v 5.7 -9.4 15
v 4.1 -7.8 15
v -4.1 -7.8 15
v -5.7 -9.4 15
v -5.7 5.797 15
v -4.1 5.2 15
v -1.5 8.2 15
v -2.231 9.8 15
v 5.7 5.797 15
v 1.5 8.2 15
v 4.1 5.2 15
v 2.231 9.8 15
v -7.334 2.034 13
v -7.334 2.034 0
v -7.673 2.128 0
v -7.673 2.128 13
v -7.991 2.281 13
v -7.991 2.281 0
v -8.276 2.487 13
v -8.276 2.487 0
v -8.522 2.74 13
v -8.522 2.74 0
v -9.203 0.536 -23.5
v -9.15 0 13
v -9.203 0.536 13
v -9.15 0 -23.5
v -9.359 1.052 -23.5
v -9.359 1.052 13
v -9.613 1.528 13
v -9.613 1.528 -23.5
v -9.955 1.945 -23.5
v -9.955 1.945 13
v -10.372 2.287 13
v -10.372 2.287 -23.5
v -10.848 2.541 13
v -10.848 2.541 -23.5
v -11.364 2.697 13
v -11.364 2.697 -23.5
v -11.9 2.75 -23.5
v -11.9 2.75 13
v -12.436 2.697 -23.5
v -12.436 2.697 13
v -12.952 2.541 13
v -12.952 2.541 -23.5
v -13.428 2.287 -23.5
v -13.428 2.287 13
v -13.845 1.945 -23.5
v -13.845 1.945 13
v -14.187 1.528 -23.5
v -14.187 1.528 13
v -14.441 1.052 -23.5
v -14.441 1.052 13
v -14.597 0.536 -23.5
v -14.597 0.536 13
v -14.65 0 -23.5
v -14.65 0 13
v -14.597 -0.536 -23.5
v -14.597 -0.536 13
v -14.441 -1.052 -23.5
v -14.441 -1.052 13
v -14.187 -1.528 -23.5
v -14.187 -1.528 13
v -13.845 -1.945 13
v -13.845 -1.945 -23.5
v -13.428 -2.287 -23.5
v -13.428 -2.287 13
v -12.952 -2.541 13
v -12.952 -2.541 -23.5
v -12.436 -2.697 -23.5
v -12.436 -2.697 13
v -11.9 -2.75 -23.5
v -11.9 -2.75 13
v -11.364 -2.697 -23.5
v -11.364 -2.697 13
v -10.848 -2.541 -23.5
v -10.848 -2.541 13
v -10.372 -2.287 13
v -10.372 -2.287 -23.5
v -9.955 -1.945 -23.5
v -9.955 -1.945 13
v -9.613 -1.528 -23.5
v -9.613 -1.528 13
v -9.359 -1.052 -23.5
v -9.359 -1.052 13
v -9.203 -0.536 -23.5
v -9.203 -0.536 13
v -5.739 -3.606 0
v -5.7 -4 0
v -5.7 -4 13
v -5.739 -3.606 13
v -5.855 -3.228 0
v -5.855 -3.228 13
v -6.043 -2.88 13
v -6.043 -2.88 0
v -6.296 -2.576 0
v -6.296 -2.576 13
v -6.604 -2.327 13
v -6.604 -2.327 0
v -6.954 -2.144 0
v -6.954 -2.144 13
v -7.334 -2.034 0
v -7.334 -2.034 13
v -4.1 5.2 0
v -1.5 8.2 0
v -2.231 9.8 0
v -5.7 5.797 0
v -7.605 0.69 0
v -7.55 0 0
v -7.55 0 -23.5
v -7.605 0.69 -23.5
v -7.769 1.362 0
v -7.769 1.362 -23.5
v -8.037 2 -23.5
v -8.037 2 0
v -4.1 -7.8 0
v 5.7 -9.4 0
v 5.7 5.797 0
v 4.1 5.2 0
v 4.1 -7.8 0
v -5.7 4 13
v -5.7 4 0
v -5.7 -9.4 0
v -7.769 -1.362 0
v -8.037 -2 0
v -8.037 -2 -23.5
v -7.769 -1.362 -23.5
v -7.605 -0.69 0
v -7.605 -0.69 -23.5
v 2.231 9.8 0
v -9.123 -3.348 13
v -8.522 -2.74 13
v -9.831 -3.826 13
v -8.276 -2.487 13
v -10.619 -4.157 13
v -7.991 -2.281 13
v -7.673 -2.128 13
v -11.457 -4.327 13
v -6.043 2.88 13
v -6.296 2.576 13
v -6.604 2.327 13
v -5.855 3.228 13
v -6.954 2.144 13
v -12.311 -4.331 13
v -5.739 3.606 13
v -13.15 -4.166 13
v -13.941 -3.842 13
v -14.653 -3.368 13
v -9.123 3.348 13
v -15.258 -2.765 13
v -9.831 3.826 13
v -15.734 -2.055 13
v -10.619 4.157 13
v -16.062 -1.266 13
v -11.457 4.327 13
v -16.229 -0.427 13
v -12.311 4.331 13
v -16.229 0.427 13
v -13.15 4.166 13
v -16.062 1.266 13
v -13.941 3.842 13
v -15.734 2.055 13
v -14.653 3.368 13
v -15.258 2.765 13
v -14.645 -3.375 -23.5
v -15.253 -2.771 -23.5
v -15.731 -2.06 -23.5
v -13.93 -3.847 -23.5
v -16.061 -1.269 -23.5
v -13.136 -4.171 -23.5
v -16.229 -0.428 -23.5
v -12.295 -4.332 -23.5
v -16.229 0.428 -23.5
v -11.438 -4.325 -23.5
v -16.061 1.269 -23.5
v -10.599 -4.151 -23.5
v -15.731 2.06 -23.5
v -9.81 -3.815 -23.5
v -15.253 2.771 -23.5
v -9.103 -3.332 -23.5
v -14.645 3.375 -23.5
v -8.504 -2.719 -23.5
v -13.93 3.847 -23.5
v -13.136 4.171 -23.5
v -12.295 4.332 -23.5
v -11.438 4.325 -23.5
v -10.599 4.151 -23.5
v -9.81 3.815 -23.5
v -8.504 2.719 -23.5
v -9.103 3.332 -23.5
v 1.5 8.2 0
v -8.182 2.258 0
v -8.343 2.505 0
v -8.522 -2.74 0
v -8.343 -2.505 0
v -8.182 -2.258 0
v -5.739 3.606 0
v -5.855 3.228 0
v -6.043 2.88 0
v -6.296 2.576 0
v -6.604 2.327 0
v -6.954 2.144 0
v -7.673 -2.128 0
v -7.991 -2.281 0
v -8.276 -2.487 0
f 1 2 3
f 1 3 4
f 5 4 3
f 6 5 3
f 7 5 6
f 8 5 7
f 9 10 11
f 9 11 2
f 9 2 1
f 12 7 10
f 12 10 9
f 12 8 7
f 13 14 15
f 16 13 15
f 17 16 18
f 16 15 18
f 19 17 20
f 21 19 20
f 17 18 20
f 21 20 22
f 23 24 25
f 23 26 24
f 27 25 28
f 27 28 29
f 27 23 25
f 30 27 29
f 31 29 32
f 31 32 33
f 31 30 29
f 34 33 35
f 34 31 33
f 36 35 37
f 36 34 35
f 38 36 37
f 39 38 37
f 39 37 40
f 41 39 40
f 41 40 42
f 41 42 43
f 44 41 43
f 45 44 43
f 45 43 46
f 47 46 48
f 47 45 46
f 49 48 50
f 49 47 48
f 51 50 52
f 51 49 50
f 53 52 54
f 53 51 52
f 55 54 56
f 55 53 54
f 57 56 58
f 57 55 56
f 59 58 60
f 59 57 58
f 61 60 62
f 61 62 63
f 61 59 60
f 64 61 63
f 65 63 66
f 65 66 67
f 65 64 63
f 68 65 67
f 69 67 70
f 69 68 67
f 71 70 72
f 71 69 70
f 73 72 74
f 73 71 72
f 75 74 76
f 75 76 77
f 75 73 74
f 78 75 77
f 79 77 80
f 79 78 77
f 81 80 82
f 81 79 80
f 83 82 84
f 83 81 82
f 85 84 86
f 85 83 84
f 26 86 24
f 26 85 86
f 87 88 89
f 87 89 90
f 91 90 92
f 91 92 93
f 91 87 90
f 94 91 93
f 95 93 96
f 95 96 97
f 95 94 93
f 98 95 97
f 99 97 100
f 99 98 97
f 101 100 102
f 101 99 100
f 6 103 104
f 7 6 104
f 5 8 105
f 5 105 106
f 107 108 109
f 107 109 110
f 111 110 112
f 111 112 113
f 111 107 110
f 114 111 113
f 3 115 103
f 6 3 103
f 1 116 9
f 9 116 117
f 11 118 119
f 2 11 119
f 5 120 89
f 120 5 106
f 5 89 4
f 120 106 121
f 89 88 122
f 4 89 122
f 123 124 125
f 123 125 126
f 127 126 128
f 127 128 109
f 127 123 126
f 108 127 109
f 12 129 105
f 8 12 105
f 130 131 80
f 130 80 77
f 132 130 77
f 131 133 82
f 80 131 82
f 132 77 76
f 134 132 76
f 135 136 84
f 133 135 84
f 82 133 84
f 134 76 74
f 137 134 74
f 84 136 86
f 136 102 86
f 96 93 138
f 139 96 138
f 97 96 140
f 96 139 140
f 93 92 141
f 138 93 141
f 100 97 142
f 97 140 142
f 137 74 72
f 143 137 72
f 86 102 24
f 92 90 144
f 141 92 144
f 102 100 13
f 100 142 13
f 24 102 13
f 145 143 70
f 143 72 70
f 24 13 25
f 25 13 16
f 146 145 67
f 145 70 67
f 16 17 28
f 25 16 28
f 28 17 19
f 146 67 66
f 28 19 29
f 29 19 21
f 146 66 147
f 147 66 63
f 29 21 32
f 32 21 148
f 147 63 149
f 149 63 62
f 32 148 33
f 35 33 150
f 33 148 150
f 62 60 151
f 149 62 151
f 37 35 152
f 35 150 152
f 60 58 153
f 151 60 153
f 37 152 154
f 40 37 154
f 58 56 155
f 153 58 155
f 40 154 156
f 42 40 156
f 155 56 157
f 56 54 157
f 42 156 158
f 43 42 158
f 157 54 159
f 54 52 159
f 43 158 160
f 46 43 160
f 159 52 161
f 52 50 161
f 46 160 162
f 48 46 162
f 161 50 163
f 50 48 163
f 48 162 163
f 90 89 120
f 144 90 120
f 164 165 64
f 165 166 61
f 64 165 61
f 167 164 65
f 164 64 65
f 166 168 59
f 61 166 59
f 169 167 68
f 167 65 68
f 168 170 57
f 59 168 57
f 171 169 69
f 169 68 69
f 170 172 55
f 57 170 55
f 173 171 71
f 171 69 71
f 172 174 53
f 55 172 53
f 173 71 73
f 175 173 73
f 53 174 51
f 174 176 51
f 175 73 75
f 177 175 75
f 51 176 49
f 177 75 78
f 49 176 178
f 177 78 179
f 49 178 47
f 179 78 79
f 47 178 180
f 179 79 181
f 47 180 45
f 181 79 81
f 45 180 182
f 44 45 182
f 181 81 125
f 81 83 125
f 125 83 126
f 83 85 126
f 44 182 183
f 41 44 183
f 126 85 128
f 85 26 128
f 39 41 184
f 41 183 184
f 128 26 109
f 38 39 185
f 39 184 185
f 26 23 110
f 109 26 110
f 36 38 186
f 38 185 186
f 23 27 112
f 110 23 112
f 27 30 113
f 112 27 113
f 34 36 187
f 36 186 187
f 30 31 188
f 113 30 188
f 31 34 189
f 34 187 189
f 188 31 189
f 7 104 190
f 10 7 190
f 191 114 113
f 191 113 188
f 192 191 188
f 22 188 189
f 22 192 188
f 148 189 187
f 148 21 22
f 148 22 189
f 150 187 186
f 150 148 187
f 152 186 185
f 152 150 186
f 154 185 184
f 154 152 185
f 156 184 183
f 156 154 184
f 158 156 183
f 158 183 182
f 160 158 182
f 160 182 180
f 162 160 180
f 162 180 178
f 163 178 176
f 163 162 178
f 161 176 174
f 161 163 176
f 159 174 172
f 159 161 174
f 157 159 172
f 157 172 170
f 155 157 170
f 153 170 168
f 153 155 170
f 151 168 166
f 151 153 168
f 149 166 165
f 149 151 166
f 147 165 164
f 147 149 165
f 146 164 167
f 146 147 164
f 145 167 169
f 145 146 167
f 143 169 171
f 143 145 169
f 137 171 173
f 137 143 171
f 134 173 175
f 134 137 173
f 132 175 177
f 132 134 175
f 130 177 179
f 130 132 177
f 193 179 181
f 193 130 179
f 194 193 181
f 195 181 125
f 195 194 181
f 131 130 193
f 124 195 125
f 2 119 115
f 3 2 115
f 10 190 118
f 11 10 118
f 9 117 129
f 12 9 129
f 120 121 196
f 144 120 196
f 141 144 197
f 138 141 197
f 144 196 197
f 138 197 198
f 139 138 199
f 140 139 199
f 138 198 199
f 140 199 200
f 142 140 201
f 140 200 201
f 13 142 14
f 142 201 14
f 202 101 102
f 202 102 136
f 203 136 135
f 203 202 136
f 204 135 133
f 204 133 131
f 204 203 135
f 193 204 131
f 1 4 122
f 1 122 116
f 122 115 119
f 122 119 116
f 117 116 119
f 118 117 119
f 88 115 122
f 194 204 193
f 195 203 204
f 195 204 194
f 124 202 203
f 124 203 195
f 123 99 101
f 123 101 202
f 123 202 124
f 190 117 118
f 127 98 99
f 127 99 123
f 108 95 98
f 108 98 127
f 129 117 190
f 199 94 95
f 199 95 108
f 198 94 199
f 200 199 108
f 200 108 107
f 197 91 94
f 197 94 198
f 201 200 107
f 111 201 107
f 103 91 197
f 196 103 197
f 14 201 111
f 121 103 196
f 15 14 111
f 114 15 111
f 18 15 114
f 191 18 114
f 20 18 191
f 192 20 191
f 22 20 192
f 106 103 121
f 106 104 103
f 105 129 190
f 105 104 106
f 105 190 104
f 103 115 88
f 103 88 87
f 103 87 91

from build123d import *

# Parameters (mm, degrees)
F1_DEPTH      = 15
F2_DEPTH      = 13
F0_R          = 2.75
F3_DEPTH      = 13
F3_DEPTH_BACK = 23.5
F4_T1_DEPTH   = 13


# Not quite as in the source:
# - a fillet or chamfer that OpenCascade refuses, or shapes differently, is made with other operations: its cross-section is extruded or revolved along the edge and cut away or added


with BuildPart() as f1:
    # F0 (on Top) → F1 (new body)
    with BuildSketch(Plane.XY):
        Polygon((2.2306062124, 9.8), (0, 9.8), (-2.2306062124, 9.8), (-5.7, 5.796853322), (-5.7, 2), (-5.7, -2), (-5.7, -9.4), (0, -9.4), (5.7, -9.4), (5.7, 5.796853322), align=None)
        Polygon((-1.5, 8.2), (0, 8.2), (1.5, 8.2), (4.1, 5.2), (4.1, -7.8), (0, -7.8), (-4.1, -7.8), (-4.1, 5.2), align=None, mode=Mode.SUBTRACT)
    extrude(amount=F1_DEPTH)

    # F0 (on Top) → F2 (join)
    with BuildSketch(Plane.XY):
        with BuildLine():
            Line((-5.7, -2), (-5.7, 2))
            Line((-5.7, 2), (-8.0370348177, 2))
            ThreePointArc((-8.0370348177, 2), (-7.6735121825, 1.0292233618), (-7.55, 0))
            ThreePointArc((-7.55, 0), (-7.6735121825, -1.0292233618), (-8.0370348177, -2))
            Line((-8.0370348177, -2), (-5.7, -2))
        make_face()
        with BuildLine():
            ThreePointArc((-7.55, 0), (-7.6735121825, 1.0292233618), (-8.0370348177, 2))
            Line((-8.0370348177, 2), (-8.4, 2))
            Line((-8.4, 2), (-8.4, -2))
            Line((-8.4, -2), (-8.0370348177, -2))
            ThreePointArc((-8.0370348177, -2), (-7.6735121825, -1.0292233618), (-7.55, 0))
        make_face()
    extrude(amount=F2_DEPTH)

    # F0 (on Top) → F3 (join, two sides)
    with BuildSketch(Plane.XY) as f3_sk:
        with BuildLine():
            Line((-8.4, 2), (-8.0370348177, 2))
            ThreePointArc((-8.0370348177, 2), (-16.25, 0), (-8.0370348177, -2))
            Line((-8.0370348177, -2), (-8.4, -2))
            Line((-8.4, -2), (-8.4, 2))
        make_face()
        with Locations((-11.9, 0)):
            Circle(F0_R, mode=Mode.SUBTRACT)
        with BuildLine():
            ThreePointArc((-7.55, 0), (-7.6735121825, 1.0292233618), (-8.0370348177, 2))
            Line((-8.0370348177, 2), (-8.4, 2))
            Line((-8.4, 2), (-8.4, -2))
            Line((-8.4, -2), (-8.0370348177, -2))
            ThreePointArc((-8.0370348177, -2), (-7.6735121825, -1.0292233618), (-7.55, 0))
        make_face()
    extrude(amount=F3_DEPTH)
    extrude(f3_sk.sketch, amount=-F3_DEPTH_BACK)

    # F4: fillet of radius 2 on 4 edges, made by hand

    # F4_s2 → F4_t1 (join)
    with BuildSketch(Plane.XY):
        with BuildLine():
            ThreePointArc((-5.7, -4), (-6.2857864376, -2.5857864376), (-7.7, -2))
            Line((-7.7, -2), (-5.7, -2))
            Line((-5.7, -2), (-5.7, -4))
        make_face()
        with BuildLine():
            ThreePointArc((-5.7, 4), (-6.2857864376, 2.5857864376), (-7.7, 2))
            Line((-7.7, 2), (-5.7, 2))
            Line((-5.7, 2), (-5.7, 4))
        make_face()
        with BuildLine():
            ThreePointArc((-6.9682153332, -2), (-7.8285393886, -2.1944966021), (-8.5215333385, -2.7401574803))
            ThreePointArc((-8.5215333385, -2.7401574803), (-8.2604200708, -2.382426901), (-8.0370348177, -2))
            Line((-8.0370348177, -2), (-6.9682153332, -2))
        make_face()
        with BuildLine():
            ThreePointArc((-6.9682153332, 2), (-7.8285393886, 2.1944966021), (-8.5215333385, 2.7401574803))
            ThreePointArc((-8.5215333385, 2.7401574803), (-8.2604200708, 2.382426901), (-8.0370348177, 2))
            Line((-8.0370348177, 2), (-6.9682153332, 2))
        make_face()
    extrude(amount=F4_T1_DEPTH)


solid = f1.part
